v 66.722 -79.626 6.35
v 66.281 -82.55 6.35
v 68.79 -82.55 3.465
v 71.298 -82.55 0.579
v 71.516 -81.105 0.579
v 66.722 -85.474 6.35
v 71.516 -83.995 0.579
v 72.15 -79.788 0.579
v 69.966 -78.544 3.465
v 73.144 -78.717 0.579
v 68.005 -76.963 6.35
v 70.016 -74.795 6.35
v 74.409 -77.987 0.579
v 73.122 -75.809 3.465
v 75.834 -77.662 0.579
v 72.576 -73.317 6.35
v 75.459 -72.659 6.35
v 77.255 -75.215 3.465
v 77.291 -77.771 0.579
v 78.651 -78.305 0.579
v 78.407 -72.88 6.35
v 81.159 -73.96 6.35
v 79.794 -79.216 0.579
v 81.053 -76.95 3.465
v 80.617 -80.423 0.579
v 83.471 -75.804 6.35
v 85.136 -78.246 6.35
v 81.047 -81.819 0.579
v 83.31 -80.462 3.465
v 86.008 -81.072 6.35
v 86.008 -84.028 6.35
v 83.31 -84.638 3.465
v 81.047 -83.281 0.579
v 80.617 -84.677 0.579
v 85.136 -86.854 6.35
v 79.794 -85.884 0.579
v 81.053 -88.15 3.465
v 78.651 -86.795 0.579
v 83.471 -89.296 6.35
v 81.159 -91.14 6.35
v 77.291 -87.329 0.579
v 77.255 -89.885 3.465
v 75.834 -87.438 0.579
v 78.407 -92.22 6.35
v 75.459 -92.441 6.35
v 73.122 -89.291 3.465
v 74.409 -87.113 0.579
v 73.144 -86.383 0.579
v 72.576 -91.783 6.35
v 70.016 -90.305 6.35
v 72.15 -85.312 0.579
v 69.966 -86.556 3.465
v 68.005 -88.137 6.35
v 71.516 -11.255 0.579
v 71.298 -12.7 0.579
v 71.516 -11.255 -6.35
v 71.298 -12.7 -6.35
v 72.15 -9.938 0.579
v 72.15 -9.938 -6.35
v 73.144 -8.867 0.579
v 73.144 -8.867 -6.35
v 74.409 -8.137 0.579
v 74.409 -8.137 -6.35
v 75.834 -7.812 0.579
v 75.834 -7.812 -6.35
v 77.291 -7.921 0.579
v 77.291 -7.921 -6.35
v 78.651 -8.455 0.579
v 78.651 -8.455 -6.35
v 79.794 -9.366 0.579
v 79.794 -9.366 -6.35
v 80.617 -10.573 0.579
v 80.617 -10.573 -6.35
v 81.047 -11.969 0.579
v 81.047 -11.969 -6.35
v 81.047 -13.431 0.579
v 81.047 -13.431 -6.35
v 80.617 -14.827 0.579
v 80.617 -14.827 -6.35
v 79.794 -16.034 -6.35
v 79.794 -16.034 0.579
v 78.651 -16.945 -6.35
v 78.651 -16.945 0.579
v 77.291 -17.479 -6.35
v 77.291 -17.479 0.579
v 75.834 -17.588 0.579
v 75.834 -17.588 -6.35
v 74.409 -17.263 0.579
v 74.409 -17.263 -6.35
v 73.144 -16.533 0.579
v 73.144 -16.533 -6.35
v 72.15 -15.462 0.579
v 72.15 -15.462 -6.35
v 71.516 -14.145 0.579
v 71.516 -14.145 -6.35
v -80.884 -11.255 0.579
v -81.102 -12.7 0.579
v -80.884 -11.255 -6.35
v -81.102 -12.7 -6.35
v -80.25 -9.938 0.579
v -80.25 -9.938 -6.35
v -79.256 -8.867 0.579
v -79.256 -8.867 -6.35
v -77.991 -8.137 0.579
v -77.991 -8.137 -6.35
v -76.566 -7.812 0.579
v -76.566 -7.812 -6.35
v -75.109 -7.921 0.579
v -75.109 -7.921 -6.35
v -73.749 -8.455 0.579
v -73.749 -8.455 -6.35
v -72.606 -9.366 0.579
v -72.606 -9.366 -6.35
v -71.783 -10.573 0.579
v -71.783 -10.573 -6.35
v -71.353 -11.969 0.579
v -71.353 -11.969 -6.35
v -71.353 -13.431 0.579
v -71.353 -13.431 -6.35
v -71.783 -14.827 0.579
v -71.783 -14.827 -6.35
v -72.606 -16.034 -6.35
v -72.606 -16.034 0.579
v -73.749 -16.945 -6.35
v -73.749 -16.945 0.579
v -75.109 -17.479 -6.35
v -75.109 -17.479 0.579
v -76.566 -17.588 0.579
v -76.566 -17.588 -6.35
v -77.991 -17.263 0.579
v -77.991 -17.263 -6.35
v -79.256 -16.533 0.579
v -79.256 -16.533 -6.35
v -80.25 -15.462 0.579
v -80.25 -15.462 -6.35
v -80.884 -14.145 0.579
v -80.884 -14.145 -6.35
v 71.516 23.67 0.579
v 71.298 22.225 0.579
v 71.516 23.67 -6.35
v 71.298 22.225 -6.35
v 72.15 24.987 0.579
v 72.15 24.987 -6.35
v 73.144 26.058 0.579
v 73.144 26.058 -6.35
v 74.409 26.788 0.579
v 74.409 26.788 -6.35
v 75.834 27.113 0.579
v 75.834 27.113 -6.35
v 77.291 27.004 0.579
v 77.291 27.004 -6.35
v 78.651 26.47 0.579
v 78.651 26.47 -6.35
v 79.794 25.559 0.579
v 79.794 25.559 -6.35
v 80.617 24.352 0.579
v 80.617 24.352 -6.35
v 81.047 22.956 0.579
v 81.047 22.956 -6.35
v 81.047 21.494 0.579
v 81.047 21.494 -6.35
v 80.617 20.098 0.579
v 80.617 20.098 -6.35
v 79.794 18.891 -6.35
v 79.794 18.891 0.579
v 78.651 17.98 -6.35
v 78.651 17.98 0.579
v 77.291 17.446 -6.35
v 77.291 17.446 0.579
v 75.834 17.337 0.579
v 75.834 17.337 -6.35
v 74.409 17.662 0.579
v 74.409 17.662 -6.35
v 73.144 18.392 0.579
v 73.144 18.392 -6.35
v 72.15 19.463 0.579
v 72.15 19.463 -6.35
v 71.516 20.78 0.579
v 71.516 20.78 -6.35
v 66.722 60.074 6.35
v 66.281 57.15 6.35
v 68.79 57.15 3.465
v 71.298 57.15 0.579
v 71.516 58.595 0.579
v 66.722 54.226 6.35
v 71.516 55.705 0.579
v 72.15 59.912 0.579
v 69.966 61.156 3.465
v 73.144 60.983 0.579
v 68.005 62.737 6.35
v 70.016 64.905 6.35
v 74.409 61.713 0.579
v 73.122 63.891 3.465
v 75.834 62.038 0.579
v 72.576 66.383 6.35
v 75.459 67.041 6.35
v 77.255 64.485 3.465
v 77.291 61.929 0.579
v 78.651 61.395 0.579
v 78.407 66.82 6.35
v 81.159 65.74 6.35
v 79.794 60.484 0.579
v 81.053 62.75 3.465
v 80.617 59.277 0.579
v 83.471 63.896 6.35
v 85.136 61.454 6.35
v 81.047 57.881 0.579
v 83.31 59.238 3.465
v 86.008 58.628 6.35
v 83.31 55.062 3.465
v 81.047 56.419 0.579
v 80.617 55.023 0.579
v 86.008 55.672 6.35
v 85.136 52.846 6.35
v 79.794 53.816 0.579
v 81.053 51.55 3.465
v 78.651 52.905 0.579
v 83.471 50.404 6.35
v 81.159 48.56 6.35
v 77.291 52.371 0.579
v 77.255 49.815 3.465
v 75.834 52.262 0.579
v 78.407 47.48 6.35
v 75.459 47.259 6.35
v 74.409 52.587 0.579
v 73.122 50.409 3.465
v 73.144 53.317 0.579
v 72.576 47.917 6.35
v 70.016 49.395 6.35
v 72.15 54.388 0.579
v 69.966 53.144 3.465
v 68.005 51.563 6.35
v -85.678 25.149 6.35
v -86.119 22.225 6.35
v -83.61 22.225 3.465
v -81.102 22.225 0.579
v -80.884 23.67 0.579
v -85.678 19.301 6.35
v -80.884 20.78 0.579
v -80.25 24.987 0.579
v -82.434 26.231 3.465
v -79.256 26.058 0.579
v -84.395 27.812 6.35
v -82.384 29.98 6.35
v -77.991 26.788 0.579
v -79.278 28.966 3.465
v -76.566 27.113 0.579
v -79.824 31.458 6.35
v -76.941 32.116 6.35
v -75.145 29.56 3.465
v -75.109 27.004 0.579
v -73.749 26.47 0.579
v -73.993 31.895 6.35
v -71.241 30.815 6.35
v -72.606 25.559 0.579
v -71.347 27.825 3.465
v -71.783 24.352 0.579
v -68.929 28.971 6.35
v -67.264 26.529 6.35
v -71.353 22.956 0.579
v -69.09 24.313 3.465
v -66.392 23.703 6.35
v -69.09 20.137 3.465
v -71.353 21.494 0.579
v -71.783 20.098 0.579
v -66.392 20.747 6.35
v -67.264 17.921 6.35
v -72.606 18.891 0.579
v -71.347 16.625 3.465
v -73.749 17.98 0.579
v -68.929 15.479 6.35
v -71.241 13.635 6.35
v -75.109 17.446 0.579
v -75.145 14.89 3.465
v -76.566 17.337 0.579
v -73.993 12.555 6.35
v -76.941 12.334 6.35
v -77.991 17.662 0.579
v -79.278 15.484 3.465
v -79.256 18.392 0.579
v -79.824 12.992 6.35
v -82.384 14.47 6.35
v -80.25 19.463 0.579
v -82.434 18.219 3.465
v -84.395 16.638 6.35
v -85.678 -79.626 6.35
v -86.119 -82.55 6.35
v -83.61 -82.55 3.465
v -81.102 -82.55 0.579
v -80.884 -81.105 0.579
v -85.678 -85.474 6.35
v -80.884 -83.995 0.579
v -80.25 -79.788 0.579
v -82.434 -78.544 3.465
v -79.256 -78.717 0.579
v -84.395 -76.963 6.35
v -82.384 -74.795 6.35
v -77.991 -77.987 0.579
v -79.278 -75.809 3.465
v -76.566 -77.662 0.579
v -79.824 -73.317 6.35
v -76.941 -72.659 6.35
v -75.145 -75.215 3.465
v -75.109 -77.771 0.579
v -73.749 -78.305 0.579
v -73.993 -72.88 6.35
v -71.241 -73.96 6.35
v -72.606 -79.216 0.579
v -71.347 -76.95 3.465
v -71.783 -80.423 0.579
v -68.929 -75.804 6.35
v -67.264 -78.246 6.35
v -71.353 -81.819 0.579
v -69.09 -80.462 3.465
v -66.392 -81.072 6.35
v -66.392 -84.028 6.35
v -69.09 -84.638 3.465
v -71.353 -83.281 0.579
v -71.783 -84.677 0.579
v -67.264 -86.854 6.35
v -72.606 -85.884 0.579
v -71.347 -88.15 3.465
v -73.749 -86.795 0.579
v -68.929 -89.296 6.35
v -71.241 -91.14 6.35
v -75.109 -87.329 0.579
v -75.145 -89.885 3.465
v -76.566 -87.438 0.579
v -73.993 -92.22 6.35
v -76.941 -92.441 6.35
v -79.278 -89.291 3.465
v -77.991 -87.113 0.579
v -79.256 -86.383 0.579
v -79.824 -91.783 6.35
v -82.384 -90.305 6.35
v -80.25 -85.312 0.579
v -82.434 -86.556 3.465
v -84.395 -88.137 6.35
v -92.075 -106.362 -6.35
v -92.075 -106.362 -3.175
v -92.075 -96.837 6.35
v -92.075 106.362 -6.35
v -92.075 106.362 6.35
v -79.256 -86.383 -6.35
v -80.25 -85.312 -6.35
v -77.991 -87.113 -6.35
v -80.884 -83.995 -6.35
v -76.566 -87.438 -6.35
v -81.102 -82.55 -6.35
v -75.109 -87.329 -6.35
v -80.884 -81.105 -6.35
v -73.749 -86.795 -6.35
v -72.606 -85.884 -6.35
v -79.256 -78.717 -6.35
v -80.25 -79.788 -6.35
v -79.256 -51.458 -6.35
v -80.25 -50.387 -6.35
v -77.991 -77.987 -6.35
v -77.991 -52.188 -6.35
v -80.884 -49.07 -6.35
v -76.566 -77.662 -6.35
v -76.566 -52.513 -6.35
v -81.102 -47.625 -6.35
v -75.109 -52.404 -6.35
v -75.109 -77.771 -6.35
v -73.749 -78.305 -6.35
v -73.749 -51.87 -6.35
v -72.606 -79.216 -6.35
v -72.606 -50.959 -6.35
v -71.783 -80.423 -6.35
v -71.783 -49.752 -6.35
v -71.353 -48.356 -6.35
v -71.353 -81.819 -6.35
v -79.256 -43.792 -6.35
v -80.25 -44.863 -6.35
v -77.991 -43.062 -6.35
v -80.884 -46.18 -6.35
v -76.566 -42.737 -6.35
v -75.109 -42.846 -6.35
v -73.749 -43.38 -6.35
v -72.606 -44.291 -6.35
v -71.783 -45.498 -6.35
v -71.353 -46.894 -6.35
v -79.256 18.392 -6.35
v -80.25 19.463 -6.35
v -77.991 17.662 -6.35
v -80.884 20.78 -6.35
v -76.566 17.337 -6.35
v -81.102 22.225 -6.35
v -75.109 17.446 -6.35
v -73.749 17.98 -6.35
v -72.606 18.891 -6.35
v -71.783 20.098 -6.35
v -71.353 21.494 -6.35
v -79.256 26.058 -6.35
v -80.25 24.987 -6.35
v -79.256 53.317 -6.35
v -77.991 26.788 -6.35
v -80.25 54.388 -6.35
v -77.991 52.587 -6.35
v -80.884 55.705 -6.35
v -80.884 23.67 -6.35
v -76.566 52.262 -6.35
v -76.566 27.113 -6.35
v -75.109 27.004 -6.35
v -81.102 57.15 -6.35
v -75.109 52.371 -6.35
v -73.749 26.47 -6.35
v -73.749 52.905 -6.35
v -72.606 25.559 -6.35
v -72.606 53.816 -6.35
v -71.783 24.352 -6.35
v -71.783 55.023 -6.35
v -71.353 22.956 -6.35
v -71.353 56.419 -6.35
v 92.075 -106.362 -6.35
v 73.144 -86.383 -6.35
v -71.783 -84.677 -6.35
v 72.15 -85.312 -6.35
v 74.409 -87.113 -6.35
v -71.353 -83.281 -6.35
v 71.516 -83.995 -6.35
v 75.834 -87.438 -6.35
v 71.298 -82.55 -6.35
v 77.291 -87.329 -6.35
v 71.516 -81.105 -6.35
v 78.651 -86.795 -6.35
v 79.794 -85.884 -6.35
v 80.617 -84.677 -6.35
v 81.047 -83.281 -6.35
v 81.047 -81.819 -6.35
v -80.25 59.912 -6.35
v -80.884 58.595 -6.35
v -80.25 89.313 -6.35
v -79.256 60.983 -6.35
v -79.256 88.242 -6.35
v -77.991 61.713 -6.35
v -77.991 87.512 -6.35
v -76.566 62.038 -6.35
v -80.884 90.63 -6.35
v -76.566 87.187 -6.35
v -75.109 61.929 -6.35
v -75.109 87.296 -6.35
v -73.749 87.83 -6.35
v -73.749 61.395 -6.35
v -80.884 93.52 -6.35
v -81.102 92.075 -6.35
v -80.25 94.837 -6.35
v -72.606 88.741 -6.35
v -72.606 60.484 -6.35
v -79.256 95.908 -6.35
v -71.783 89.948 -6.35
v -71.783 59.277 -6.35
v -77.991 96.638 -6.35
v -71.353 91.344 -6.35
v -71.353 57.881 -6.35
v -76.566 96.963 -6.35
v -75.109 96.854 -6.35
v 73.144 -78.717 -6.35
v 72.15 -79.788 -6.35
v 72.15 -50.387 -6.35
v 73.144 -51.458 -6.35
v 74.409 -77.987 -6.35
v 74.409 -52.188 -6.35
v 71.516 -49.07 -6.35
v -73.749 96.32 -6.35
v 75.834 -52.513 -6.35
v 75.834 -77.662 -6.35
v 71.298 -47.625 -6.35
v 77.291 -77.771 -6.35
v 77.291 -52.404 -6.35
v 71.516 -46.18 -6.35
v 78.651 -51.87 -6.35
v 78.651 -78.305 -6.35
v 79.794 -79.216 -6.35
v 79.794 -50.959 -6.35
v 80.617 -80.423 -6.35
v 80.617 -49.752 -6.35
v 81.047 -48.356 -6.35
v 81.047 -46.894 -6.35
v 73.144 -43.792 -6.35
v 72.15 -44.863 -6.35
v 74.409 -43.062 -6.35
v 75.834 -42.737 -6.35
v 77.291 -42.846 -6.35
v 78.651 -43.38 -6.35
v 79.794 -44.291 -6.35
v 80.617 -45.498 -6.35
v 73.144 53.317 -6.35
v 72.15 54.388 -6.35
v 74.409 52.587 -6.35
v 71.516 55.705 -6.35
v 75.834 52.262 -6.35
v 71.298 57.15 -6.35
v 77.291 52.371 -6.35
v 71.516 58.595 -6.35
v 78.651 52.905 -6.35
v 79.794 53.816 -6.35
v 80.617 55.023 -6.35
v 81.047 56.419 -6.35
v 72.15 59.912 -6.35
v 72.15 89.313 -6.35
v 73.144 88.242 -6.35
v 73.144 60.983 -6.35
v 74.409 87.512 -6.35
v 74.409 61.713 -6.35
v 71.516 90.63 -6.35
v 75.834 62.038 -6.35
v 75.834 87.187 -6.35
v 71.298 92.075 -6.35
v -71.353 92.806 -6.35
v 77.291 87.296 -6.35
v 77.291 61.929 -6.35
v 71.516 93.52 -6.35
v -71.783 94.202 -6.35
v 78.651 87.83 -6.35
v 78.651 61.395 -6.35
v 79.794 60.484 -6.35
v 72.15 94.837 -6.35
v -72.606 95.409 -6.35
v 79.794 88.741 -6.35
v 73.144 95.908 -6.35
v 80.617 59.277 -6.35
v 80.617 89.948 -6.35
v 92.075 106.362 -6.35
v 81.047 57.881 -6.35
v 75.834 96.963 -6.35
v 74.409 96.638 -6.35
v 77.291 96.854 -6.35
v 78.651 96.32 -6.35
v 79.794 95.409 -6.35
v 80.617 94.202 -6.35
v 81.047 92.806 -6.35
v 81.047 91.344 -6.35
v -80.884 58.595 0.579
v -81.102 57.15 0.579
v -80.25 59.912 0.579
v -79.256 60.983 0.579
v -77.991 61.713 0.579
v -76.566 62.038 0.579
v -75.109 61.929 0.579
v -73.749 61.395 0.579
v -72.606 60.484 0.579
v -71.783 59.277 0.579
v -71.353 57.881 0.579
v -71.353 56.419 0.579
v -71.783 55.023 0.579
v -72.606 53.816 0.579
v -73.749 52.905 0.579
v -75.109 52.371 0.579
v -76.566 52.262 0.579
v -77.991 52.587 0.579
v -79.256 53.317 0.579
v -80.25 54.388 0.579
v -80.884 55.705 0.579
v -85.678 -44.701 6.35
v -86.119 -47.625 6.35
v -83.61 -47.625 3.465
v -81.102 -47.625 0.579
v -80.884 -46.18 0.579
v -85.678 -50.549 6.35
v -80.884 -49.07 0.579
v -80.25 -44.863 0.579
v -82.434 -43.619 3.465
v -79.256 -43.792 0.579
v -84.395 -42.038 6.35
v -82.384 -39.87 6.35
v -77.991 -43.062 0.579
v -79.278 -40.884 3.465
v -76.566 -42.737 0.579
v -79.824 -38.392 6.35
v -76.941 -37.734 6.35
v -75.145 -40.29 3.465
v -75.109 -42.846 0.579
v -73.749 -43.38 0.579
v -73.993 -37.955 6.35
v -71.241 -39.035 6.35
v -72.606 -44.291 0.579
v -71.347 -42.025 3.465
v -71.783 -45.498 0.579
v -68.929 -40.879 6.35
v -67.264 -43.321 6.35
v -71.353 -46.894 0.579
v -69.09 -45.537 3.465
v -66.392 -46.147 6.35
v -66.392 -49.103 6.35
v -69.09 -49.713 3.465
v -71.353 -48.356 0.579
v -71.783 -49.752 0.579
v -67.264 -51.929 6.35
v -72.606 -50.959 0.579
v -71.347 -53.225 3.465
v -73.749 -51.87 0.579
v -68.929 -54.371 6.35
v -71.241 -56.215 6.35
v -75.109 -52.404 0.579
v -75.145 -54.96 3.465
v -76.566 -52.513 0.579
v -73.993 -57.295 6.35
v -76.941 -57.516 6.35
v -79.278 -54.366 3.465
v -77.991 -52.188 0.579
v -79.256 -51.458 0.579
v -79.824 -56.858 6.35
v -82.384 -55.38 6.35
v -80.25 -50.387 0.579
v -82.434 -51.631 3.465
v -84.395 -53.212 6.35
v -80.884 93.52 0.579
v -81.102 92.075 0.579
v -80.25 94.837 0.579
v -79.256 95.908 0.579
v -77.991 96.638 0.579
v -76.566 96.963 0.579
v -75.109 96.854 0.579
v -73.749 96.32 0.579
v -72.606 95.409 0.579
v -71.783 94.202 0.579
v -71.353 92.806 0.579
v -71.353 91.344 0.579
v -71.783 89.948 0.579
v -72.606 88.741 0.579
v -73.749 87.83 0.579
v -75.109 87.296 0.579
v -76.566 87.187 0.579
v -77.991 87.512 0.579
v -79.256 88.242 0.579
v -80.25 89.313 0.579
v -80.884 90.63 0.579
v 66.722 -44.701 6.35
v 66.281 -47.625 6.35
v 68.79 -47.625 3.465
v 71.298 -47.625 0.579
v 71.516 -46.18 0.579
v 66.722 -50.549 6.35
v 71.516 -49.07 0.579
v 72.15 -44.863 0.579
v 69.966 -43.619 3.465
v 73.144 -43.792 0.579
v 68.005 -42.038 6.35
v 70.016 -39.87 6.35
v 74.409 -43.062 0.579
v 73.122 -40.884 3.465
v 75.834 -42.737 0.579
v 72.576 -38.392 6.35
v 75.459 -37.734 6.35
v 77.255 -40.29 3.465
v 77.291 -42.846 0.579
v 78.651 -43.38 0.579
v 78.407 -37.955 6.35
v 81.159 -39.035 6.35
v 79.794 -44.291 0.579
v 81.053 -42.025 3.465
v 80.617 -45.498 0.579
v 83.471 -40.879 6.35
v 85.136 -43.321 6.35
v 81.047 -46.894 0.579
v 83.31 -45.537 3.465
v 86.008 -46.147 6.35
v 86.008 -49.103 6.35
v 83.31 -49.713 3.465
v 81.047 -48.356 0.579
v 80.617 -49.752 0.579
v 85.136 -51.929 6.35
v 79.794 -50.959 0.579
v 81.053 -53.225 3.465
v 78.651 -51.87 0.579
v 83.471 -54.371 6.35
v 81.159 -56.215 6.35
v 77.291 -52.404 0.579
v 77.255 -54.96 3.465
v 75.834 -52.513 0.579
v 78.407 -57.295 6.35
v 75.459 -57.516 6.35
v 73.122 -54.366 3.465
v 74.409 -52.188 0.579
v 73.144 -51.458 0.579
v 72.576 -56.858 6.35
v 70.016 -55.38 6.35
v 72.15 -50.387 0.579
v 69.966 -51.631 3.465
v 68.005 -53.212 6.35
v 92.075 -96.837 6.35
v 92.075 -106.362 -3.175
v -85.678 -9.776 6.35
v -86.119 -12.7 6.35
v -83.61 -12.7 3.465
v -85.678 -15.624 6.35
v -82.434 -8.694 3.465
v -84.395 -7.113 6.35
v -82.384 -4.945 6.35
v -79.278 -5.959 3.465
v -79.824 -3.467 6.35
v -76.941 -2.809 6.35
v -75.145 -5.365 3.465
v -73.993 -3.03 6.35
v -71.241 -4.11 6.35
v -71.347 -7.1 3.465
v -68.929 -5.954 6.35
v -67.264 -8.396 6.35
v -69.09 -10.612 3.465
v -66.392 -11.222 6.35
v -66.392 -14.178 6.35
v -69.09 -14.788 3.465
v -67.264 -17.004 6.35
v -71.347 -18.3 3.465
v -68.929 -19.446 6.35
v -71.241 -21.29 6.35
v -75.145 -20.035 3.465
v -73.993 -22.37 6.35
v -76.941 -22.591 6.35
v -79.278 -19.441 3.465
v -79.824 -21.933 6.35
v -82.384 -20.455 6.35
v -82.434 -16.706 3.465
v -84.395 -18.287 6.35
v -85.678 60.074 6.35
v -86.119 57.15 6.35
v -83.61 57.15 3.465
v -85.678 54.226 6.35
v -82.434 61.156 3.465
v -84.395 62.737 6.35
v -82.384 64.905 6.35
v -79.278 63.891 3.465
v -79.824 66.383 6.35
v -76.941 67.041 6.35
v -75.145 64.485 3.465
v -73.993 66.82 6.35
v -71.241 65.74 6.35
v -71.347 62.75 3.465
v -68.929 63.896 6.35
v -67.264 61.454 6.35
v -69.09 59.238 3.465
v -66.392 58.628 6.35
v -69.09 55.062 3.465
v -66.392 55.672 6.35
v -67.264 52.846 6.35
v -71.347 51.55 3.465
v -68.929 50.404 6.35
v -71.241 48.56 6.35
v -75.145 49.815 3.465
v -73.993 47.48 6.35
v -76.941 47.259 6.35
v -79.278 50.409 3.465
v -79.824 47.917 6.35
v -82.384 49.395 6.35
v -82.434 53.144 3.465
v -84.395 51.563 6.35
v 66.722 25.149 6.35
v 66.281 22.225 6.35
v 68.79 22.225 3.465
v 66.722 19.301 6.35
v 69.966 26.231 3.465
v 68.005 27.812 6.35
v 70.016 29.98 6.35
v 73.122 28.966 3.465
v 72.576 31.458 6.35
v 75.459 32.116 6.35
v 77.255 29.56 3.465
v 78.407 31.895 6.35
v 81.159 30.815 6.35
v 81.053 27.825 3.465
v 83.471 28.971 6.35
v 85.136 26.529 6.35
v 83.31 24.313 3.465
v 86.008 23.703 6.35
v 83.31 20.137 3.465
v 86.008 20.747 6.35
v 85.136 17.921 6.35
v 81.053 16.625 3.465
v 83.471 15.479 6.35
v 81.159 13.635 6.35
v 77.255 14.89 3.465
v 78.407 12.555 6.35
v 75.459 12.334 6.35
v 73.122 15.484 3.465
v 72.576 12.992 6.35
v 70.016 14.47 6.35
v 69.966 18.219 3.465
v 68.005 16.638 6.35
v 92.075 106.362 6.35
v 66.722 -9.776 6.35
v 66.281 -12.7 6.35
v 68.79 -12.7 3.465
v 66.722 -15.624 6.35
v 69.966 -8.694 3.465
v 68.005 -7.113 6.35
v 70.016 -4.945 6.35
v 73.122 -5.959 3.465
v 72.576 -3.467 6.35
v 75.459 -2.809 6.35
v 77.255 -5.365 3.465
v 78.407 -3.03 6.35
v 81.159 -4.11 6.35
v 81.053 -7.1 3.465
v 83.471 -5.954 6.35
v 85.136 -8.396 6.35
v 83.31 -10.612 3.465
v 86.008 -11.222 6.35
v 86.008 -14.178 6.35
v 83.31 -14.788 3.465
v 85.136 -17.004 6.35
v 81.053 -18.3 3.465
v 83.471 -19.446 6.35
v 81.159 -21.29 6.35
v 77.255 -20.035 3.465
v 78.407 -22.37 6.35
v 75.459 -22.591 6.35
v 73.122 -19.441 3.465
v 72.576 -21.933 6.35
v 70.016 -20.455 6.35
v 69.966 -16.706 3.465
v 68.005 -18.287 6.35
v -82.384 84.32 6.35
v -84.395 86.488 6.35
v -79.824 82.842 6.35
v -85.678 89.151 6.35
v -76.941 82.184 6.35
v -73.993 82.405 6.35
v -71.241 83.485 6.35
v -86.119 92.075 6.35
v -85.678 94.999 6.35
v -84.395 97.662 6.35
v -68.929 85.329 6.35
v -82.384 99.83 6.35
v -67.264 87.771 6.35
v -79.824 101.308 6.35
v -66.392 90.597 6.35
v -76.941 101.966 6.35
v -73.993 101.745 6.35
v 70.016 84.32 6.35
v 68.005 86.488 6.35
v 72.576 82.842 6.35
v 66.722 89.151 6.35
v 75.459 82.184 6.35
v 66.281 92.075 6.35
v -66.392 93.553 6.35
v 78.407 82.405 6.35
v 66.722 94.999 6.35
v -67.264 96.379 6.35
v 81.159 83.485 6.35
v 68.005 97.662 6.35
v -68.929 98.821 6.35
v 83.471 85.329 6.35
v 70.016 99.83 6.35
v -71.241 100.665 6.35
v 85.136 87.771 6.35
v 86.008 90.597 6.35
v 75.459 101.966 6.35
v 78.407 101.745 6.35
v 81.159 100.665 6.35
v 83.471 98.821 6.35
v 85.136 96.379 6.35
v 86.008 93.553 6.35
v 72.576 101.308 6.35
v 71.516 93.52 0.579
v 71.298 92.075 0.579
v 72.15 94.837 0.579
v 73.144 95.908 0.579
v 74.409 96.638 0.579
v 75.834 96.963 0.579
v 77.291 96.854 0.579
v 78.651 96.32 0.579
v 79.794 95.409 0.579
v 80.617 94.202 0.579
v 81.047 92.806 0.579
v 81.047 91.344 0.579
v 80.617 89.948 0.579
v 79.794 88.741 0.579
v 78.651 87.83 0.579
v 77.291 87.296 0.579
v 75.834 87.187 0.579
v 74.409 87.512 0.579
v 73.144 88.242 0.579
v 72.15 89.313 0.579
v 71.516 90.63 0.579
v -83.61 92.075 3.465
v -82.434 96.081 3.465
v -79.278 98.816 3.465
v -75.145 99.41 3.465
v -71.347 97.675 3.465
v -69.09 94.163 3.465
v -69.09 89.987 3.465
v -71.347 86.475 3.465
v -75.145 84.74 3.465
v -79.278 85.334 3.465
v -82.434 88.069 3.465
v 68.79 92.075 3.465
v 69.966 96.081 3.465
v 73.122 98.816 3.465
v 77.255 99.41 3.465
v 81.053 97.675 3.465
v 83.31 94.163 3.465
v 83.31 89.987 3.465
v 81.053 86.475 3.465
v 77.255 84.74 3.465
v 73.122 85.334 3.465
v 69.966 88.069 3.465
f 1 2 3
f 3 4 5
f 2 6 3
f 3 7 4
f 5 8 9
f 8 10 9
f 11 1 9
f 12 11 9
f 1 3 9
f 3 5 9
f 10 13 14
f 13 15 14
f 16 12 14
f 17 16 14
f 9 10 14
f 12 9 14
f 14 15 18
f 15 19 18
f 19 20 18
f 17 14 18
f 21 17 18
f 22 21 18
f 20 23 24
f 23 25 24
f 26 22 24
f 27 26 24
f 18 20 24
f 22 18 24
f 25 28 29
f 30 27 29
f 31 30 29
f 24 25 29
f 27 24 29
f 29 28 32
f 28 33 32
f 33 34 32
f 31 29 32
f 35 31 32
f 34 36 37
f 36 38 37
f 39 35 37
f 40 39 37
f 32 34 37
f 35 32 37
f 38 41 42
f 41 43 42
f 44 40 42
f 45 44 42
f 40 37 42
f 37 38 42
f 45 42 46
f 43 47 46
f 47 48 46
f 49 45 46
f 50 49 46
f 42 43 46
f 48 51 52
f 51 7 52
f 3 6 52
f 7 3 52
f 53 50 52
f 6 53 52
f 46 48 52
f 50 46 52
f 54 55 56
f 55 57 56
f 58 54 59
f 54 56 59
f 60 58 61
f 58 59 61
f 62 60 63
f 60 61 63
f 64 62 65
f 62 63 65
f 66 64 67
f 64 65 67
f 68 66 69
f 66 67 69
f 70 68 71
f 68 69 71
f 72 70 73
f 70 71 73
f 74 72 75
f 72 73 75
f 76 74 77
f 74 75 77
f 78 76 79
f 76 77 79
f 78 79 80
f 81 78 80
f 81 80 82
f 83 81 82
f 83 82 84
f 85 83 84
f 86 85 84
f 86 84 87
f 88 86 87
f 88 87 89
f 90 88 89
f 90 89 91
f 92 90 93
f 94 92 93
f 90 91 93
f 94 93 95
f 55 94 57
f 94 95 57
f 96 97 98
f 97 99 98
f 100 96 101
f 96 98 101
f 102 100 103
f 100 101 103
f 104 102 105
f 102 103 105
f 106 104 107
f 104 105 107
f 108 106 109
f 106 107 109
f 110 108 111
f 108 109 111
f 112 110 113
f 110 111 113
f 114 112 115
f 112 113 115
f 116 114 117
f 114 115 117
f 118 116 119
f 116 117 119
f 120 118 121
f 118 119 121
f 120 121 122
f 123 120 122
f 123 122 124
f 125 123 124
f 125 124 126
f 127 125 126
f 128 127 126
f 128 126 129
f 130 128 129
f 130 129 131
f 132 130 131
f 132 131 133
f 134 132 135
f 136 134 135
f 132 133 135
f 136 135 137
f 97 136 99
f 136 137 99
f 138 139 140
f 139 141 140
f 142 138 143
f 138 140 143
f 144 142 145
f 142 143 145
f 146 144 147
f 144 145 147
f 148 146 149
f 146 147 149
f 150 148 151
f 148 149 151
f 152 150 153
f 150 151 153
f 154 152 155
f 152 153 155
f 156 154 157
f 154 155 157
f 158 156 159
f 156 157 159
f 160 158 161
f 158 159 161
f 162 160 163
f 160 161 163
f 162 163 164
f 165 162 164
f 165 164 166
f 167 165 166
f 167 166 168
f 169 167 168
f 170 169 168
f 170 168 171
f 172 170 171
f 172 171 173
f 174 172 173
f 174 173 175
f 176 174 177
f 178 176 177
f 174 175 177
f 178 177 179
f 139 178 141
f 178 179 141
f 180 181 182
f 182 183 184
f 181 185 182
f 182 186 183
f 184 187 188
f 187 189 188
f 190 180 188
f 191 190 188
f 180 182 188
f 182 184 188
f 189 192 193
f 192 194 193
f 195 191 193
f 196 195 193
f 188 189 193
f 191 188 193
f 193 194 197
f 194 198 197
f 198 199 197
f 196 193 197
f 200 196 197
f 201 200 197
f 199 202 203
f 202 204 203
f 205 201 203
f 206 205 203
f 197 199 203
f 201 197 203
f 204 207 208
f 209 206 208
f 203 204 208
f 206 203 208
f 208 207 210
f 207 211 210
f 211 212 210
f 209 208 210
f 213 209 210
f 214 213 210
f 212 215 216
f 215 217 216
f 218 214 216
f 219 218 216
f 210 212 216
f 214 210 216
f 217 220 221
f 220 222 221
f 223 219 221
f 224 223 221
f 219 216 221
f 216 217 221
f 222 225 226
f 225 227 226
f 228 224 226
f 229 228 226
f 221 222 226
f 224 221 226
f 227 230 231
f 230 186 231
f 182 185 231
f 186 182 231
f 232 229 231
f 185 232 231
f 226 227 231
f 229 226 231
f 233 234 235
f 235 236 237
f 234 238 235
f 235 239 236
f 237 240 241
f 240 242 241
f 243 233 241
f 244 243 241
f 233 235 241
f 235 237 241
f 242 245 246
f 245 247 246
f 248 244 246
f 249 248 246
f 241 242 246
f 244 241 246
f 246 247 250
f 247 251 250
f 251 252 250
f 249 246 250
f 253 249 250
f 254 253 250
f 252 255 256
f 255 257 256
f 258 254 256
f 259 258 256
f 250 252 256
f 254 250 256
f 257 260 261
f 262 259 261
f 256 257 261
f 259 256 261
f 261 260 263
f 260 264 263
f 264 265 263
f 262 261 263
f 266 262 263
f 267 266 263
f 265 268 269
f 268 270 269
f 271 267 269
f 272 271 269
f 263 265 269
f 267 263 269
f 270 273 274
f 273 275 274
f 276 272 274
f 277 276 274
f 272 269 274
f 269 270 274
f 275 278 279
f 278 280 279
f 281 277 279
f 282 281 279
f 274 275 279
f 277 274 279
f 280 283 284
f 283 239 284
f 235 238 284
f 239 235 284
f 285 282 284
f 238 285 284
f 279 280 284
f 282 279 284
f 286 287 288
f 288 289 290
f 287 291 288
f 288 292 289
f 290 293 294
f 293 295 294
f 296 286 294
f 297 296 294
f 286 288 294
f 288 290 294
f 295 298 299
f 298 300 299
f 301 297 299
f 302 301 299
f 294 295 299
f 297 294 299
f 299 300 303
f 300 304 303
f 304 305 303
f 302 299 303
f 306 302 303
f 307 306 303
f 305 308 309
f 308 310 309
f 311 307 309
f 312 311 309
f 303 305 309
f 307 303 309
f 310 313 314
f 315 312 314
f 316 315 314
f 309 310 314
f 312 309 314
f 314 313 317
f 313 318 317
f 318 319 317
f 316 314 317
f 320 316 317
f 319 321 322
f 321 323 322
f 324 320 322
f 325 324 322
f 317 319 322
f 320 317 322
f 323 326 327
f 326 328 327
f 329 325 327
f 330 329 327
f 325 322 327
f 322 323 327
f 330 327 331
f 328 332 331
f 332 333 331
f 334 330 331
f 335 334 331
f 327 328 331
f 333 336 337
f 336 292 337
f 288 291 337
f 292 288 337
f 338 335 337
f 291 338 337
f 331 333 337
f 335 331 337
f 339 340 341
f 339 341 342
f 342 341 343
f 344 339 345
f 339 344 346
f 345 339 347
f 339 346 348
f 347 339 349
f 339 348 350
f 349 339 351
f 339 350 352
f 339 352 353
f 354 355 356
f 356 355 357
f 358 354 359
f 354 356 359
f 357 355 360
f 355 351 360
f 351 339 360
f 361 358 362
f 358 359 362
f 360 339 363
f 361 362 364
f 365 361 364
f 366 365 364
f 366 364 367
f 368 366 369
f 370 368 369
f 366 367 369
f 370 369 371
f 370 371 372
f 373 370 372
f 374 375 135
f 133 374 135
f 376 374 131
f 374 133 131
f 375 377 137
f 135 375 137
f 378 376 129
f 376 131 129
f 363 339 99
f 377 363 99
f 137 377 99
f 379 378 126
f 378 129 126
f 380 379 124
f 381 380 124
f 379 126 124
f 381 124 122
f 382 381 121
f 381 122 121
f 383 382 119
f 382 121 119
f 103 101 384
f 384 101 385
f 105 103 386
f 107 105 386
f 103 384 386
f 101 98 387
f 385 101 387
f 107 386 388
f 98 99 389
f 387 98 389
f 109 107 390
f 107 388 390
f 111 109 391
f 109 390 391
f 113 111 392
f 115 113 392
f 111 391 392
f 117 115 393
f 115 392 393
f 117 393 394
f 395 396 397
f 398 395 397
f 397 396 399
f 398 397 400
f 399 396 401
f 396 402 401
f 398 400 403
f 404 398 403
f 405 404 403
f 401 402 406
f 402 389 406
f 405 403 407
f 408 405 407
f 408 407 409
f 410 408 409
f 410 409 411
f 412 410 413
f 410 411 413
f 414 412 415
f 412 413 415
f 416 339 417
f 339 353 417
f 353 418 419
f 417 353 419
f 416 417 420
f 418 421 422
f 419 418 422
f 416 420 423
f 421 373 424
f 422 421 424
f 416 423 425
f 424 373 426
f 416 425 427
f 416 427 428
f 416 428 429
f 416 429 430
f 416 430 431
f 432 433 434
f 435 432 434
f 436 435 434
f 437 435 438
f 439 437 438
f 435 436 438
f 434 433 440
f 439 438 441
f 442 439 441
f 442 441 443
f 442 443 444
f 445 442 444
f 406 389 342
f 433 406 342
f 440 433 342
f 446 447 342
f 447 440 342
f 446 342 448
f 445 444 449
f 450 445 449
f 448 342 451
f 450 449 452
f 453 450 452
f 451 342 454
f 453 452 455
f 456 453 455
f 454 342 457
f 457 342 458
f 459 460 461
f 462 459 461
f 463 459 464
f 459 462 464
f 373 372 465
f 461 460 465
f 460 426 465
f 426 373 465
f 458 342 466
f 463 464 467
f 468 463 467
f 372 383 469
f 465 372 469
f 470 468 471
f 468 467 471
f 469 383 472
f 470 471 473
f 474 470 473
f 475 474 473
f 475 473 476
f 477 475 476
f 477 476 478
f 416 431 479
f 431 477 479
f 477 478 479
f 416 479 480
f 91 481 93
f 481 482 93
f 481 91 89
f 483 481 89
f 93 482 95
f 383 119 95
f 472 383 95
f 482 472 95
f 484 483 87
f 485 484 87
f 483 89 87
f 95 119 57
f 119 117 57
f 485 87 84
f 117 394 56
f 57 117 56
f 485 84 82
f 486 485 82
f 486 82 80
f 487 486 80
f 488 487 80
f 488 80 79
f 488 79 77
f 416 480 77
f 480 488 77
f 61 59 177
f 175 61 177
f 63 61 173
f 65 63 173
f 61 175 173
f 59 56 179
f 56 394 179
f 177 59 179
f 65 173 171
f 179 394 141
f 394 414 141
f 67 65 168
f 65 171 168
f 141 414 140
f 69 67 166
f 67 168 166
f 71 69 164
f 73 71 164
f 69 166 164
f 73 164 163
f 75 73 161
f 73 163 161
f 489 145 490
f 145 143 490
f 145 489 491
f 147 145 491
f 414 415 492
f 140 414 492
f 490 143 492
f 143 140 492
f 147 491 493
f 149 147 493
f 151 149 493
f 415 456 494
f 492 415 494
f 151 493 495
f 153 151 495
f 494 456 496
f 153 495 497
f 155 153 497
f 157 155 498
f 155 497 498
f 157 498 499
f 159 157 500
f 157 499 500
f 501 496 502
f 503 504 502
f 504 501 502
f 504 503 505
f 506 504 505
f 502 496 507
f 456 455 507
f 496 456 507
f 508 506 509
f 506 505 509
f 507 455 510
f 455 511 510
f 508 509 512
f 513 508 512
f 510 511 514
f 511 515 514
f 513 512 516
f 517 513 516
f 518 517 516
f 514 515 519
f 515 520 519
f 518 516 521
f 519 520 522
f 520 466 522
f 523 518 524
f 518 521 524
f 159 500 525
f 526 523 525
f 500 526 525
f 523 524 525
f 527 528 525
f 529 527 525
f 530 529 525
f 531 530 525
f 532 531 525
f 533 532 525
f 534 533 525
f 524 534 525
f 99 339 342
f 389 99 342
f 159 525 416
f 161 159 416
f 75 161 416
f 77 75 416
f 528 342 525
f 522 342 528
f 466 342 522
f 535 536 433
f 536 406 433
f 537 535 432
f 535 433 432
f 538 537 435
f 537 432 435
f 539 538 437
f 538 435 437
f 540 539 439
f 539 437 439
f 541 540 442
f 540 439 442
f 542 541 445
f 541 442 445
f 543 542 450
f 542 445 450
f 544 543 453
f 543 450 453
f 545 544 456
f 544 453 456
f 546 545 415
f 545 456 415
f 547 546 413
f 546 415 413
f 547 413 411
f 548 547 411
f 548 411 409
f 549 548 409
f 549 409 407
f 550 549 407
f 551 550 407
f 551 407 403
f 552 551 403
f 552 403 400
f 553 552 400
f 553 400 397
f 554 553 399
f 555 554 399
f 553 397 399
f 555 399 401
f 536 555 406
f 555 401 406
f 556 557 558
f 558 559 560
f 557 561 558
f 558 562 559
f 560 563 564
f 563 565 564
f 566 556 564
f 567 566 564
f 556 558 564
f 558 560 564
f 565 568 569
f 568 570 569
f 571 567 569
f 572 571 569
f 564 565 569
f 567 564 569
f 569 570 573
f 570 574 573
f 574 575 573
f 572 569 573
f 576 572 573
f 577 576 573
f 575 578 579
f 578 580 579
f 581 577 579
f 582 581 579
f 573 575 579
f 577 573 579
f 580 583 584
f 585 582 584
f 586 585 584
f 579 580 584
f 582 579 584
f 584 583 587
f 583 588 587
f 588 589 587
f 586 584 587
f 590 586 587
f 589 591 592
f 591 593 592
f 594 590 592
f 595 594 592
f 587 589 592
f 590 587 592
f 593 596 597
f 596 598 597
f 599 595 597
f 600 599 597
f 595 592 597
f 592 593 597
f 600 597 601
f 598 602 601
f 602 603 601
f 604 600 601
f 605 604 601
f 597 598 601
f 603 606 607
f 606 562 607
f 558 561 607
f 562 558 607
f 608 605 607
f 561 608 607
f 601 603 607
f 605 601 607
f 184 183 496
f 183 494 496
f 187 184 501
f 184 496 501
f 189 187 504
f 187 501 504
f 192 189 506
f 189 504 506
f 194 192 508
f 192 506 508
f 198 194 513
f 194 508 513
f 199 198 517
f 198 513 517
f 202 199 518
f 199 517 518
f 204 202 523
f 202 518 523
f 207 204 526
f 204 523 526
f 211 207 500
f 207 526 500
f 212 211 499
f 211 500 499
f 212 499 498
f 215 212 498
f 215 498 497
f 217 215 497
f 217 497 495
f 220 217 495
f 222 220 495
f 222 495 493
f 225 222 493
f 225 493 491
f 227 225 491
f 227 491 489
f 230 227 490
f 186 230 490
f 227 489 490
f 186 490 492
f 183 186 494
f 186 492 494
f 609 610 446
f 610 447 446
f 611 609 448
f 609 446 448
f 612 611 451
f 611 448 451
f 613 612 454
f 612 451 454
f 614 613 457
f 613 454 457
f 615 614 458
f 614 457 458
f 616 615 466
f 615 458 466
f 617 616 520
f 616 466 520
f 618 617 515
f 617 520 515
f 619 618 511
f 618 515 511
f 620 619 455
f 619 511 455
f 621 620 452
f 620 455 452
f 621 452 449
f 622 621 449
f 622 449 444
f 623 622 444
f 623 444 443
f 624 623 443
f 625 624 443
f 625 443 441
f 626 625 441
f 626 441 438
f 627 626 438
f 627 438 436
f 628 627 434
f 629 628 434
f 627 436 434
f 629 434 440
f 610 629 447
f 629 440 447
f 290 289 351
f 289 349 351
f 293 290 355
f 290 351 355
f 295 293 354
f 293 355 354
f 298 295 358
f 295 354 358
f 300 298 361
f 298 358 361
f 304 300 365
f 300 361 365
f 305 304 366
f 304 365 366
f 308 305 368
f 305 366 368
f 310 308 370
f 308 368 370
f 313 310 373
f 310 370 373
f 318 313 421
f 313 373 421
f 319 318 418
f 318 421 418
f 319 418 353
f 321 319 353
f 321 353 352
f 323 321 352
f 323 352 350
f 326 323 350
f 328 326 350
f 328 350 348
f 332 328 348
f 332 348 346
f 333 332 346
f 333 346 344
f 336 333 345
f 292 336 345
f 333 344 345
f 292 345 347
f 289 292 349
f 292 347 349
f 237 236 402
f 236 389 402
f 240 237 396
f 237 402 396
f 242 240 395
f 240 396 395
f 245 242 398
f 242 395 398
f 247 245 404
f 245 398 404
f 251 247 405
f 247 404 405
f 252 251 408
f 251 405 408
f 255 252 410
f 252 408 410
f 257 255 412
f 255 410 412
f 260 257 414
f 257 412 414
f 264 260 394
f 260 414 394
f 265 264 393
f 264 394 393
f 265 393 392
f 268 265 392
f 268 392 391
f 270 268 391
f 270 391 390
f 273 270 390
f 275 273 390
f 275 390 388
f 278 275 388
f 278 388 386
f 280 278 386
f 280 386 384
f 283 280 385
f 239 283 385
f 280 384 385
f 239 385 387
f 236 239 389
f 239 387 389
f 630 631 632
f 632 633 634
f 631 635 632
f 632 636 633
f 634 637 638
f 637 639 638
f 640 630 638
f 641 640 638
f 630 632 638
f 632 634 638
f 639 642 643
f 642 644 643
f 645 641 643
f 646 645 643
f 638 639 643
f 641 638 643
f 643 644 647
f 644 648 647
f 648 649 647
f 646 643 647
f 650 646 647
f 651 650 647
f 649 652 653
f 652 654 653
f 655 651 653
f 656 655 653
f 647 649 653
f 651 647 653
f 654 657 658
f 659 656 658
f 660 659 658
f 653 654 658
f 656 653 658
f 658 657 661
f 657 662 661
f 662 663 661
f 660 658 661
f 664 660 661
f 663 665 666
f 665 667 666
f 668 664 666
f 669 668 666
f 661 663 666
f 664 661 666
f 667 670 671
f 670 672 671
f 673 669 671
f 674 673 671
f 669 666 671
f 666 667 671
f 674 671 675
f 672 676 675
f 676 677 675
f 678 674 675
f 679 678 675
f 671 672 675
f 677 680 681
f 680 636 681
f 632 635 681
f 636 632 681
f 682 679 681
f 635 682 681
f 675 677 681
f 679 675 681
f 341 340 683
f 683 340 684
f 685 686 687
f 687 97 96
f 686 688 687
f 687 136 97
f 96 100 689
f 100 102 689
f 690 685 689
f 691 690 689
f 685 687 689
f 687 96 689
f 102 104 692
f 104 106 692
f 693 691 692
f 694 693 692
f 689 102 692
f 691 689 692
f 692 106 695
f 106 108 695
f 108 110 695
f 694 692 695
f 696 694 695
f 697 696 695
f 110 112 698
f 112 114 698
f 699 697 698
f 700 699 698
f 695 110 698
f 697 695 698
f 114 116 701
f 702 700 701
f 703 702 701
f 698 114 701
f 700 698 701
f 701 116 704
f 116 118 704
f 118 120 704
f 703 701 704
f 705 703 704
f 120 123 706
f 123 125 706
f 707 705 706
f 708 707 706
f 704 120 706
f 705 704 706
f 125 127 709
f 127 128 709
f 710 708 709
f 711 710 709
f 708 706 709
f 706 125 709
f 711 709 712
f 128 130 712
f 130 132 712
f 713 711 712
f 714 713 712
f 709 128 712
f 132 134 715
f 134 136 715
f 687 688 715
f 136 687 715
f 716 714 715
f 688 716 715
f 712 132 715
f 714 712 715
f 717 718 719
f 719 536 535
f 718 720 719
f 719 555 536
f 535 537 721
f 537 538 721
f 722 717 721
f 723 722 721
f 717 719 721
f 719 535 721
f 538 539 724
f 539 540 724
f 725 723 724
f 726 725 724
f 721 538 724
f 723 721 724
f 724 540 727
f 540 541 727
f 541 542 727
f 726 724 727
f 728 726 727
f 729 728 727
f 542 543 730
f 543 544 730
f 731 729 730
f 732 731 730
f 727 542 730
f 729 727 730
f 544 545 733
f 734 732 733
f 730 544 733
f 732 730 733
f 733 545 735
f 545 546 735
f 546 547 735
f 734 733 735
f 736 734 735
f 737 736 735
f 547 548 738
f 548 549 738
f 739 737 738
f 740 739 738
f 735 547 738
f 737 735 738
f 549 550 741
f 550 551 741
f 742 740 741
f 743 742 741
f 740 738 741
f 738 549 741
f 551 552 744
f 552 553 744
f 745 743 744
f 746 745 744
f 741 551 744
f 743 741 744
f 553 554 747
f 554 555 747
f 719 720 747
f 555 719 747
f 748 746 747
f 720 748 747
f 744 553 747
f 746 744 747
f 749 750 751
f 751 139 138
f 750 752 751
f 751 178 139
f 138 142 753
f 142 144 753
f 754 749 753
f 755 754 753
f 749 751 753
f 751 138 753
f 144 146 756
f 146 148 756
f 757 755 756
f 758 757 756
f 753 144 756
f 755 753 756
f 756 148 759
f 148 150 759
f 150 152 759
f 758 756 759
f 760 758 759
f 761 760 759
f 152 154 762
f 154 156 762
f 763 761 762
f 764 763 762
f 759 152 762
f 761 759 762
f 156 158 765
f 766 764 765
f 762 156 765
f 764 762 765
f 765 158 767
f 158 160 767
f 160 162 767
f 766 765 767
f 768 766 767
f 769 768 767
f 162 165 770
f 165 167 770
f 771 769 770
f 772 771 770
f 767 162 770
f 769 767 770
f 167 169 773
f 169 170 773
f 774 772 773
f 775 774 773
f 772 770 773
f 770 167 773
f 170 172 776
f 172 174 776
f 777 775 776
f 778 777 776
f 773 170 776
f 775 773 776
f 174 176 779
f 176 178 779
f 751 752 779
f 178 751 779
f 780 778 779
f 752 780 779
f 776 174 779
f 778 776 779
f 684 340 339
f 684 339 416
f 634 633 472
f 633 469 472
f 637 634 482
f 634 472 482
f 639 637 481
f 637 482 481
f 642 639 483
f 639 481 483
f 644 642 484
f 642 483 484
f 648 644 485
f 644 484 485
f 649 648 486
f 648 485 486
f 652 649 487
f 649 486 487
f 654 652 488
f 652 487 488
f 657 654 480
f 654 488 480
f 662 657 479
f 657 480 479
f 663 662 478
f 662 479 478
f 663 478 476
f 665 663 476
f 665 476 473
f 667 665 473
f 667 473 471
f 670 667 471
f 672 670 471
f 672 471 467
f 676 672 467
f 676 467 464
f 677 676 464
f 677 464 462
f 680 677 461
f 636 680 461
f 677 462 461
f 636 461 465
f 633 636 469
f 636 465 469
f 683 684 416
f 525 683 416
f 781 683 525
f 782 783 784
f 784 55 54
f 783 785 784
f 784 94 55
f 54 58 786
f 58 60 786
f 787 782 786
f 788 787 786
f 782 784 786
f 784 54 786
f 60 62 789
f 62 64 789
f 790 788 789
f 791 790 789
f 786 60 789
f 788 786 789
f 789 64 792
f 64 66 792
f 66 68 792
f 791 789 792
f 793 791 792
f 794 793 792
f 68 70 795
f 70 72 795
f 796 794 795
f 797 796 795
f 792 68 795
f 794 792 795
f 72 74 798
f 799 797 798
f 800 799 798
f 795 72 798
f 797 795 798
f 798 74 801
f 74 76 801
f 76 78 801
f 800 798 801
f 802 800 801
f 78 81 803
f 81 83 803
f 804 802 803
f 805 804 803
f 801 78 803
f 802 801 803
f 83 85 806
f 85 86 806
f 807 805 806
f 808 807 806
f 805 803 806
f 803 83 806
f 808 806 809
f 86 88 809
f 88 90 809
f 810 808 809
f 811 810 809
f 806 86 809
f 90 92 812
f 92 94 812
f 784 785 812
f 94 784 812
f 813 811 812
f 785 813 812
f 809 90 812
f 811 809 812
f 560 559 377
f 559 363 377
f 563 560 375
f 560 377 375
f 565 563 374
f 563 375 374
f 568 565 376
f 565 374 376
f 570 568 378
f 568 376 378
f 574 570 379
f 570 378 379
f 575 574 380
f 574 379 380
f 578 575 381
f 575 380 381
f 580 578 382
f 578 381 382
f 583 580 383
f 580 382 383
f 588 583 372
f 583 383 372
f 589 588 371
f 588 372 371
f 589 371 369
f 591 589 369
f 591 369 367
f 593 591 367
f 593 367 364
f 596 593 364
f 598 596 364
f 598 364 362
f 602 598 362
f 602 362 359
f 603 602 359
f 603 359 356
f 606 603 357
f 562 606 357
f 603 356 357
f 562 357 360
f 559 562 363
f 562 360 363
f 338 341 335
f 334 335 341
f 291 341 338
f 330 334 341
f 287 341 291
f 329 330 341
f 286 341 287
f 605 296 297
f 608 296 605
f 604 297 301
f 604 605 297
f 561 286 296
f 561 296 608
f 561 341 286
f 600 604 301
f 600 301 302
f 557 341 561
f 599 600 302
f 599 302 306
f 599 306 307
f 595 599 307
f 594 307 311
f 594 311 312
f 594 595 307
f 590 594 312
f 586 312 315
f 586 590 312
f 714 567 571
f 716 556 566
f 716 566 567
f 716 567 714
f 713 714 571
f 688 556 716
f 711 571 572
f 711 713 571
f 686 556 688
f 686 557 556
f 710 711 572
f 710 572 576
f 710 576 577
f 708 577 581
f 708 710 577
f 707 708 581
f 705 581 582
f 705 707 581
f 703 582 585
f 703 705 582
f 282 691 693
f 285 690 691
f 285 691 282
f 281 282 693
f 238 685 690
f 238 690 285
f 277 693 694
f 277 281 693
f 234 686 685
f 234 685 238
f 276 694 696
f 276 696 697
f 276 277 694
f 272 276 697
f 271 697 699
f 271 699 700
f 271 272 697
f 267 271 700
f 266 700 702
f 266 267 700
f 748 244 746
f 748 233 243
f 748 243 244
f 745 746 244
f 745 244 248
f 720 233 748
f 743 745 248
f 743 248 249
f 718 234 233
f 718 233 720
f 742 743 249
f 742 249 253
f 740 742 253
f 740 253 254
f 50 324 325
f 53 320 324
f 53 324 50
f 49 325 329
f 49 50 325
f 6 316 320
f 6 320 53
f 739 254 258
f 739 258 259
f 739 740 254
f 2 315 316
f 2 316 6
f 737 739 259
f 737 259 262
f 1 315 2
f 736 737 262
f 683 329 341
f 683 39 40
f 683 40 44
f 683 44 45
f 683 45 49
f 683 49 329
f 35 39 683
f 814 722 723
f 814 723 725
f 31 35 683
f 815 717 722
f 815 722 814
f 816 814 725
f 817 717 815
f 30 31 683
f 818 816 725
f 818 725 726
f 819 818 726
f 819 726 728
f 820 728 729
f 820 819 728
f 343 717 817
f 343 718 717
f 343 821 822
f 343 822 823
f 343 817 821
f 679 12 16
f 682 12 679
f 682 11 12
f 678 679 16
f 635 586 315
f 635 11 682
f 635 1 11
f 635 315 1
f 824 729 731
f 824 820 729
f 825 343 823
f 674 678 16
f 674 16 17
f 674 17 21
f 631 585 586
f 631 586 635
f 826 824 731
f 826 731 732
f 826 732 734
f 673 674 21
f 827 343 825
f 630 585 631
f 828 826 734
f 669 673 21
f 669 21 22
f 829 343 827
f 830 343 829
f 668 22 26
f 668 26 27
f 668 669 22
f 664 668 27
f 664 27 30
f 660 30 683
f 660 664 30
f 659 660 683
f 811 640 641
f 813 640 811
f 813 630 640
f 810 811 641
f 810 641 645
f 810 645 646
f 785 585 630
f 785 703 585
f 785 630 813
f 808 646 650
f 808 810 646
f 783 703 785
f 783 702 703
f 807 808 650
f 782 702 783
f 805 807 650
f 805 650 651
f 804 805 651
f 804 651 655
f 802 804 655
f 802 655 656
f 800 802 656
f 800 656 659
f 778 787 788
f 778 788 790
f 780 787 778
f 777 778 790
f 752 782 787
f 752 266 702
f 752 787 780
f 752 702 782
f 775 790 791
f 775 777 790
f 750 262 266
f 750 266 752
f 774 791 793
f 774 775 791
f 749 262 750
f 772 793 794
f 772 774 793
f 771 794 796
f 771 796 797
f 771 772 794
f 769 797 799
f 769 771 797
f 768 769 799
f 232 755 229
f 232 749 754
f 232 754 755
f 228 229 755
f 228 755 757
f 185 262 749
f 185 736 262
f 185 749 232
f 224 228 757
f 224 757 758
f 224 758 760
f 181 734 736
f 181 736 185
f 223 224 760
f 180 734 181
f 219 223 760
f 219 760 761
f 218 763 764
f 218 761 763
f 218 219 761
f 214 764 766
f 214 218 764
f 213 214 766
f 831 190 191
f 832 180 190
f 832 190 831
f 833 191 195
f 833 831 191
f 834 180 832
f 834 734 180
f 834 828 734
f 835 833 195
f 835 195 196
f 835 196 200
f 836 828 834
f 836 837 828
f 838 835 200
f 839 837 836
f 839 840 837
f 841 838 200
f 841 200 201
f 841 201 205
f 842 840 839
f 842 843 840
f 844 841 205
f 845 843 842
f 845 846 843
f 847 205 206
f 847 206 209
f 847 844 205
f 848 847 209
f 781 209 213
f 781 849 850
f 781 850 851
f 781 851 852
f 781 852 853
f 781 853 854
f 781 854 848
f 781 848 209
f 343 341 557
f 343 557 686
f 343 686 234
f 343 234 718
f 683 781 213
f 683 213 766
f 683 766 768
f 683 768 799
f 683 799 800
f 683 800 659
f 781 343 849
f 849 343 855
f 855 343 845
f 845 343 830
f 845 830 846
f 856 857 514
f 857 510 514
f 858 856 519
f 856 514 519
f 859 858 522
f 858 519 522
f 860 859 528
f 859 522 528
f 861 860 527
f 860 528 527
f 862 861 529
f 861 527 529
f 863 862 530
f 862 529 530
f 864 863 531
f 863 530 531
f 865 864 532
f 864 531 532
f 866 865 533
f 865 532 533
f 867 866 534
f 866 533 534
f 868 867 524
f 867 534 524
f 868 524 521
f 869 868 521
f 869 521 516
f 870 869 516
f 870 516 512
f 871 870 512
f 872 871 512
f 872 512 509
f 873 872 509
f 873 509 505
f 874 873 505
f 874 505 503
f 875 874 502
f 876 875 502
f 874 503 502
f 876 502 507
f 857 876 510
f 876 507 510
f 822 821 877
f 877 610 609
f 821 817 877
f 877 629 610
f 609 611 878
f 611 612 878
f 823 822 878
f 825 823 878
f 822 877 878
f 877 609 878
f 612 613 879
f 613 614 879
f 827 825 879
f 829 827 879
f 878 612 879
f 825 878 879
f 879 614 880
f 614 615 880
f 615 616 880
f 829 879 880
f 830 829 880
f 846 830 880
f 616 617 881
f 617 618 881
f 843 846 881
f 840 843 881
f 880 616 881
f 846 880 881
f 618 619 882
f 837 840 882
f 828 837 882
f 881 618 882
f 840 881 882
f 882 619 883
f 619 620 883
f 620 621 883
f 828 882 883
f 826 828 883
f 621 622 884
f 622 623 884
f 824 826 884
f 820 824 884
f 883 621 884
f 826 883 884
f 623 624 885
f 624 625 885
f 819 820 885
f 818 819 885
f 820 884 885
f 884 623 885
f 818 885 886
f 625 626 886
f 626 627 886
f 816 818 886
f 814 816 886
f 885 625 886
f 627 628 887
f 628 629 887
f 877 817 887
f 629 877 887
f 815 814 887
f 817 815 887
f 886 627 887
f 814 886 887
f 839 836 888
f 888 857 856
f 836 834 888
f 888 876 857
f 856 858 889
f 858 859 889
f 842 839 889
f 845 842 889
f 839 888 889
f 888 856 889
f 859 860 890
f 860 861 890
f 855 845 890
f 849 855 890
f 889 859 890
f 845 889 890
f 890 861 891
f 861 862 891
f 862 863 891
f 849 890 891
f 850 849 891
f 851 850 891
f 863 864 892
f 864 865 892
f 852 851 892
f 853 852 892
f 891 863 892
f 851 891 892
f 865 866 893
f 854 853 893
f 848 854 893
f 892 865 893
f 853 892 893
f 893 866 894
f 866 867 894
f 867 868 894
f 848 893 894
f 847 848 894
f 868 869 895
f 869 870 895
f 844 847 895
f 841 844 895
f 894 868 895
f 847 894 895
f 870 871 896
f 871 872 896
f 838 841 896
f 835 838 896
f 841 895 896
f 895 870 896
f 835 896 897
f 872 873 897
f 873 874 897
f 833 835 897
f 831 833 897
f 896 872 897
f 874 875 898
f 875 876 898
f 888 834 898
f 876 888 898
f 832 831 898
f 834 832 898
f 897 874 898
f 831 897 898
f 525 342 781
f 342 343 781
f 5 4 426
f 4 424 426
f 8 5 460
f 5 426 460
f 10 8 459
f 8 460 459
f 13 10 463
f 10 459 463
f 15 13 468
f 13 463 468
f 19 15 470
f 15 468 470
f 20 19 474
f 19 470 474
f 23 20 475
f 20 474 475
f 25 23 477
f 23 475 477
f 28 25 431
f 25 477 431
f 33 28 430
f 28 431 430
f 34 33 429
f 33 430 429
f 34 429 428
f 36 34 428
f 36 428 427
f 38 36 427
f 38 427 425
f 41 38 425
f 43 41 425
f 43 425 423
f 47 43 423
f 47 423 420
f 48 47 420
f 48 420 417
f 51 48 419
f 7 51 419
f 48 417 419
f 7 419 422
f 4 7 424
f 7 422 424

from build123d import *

# Parameters (mm, degrees)
SKETCH1_W                                           = 184.15
SKETCH1_H                                           = 212.725
BOSS_EXTRUDE1_DEPTH                                 = 6.35
CSK_FOR_3_8_FLAT_HEAD_SOCKET_CAP_SCREW1_D           = 9.8044
CSK_FOR_3_8_FLAT_HEAD_SOCKET_CAP_SCREW1_CSINK_D     = 19.8374
CSK_FOR_3_8_FLAT_HEAD_SOCKET_CAP_SCREW1_CSINK_ANGLE = 82
CHAMFER1_SIZE                                       = 9.525


with BuildPart() as part:
    # Sketch1 → Boss-Extrude1 (new body, symmetric)
    with BuildSketch(Plane.XY):
        Rectangle(SKETCH1_W, SKETCH1_H)
    extrude(amount=BOSS_EXTRUDE1_DEPTH, both=True)

    # CSK for 3/8 Flat Head Socket Cap Screw1 (through all)
    with Locations(Plane.XY.offset(6.35)):
        with Locations((-76.2, 92.075), (-76.2, 57.15), (-76.2, 22.225), (-76.2, -12.7), (-76.2, -47.625), (-76.2, -82.55), (76.2, -82.55), (76.2, -47.625), (76.2, -12.7), (76.2, 22.225), (76.2, 57.15), (76.2, 92.075)):
            CounterSinkHole(CSK_FOR_3_8_FLAT_HEAD_SOCKET_CAP_SCREW1_D / 2, CSK_FOR_3_8_FLAT_HEAD_SOCKET_CAP_SCREW1_CSINK_D / 2, counter_sink_angle=CSK_FOR_3_8_FLAT_HEAD_SOCKET_CAP_SCREW1_CSINK_ANGLE)

    # Chamfer1
    chamfer1_edges = [part.edges().sort_by_distance(p)[0] for p in [
        (0, -106.3625, 6.35),
    ]]
    chamfer(chamfer1_edges, length=CHAMFER1_SIZE)


solid = part.part
